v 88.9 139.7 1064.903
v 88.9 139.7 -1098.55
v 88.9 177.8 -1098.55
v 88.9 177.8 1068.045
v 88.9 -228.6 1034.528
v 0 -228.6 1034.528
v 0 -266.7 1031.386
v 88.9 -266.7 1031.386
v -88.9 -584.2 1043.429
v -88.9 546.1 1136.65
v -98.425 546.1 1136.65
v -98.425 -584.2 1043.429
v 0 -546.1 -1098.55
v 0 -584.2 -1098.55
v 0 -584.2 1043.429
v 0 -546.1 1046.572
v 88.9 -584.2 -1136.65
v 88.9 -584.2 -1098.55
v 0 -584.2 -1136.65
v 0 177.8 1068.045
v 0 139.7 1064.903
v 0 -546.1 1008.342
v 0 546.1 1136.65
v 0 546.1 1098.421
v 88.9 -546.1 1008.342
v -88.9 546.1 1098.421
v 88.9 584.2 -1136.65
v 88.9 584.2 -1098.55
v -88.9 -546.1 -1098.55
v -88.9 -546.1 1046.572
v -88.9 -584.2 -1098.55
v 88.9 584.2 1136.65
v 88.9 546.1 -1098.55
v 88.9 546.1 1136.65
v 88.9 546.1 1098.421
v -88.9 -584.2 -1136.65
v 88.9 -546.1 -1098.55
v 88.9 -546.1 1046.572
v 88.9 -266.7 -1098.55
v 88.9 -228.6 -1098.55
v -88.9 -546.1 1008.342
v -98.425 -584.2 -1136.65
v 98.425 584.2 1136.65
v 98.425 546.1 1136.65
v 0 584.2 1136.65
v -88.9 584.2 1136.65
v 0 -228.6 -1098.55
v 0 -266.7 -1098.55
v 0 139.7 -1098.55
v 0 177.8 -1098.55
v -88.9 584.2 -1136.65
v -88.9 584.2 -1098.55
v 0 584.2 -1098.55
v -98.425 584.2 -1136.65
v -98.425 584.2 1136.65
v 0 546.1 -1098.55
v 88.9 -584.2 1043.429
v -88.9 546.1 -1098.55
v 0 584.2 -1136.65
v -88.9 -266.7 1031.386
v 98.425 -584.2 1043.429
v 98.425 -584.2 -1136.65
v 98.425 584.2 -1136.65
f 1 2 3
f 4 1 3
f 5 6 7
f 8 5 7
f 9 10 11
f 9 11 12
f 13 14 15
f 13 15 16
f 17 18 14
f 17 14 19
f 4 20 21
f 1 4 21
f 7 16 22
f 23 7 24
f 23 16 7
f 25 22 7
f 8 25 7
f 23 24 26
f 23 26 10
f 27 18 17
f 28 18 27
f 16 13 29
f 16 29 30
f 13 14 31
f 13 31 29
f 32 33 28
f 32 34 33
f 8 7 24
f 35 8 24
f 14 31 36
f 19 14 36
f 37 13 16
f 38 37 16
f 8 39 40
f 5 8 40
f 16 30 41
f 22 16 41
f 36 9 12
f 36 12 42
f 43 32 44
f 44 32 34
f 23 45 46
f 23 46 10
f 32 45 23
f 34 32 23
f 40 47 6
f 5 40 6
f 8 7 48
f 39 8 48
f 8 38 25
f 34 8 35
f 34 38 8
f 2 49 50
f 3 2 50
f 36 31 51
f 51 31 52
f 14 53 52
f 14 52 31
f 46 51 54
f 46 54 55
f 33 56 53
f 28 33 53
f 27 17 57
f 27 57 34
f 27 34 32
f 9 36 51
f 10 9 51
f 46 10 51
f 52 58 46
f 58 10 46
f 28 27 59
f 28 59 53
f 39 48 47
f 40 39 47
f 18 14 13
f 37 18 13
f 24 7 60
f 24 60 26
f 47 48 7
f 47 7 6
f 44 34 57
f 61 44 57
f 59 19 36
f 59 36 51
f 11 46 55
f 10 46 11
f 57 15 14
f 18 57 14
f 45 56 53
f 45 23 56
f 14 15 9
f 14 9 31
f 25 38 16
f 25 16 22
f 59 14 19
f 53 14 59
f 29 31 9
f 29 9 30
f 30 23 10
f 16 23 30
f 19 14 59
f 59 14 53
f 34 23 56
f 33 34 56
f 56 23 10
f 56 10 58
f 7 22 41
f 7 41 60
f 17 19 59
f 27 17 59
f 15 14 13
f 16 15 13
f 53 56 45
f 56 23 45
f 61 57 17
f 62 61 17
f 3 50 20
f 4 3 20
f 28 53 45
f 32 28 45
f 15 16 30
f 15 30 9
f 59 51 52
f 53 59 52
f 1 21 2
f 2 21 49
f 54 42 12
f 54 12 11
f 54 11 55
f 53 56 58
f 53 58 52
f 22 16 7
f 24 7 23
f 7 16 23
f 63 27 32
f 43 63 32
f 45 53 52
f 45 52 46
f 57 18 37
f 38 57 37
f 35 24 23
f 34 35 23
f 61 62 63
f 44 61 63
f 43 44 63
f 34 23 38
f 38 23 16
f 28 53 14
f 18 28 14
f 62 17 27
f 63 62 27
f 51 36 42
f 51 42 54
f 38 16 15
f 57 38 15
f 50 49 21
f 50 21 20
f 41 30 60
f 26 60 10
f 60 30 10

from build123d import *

# Parameters (mm, degrees)
F1_DEPTH = 88.9
F2_DEPTH = 88.9
F4_DEPTH = 9.525


with BuildPart() as f1:
    # F0 (on Right) → F1 (new body)
    with BuildSketch(Plane.YZ):
        Polygon((-584.2, 1043.4293814433), (-584.2, -1098.55), (-546.1, -1098.55), (-546.1, 1008.3422910222), (-546.1, 1046.5716494845), align=None)
    extrude(amount=F1_DEPTH)


with BuildPart() as f1b:
    # F0 (on Right) → F1, piece 2 (new body)
    with BuildSketch(Plane.YZ):
        Polygon((546.1, -1098.55), (584.2, -1098.55), (584.2, 1136.65), (546.1, 1136.65), (546.1, 1098.4206415376), align=None)
    extrude(amount=F1_DEPTH)


with BuildPart() as f1c:
    # F0 (on Right) → F1, piece 3 (new body)
    with BuildSketch(Plane.YZ):
        Polygon((139.7, -1098.55), (177.8, -1098.55), (177.8, 1068.0453838057), (139.7, 1064.9031157645), align=None)
    extrude(amount=F1_DEPTH)


with BuildPart() as f1d:
    # F0 (on Right) → F1, piece 4 (new body)
    with BuildSketch(Plane.YZ):
        Polygon((-266.7, 1031.3855899913), (-266.7, -1098.55), (-228.6, -1098.55), (-228.6, 1034.5278580325), align=None)
    extrude(amount=F1_DEPTH)


with BuildPart() as f2:
    # F0 (on Right) → F2 (new body)
    with BuildSketch(Plane.YZ):
        Polygon((177.8, 1068.0453838057), (546.1, 1098.4206415376), (546.1, 1136.65), (-546.1, 1046.5716494845), (-546.1, 1008.3422910222), (-266.7, 1031.3855899913), (-266.7, 1034.5278580325), (-228.6, 1034.5278580325), (139.7, 1064.9031157645), (139.7, 1068.0453838057), align=None)
        Polygon((139.7, 1064.9031157645), (177.8, 1068.0453838057), (139.7, 1068.0453838057), align=None)
        Polygon((-266.7, 1034.5278580325), (-266.7, 1031.3855899913), (-228.6, 1034.5278580325), align=None)
    extrude(amount=F2_DEPTH)


with BuildPart() as f2b:
    # F0 (on Right) → F2, piece 2 (new body)
    with BuildSketch(Plane.YZ):
        Polygon((-584.2, -1136.65), (584.2, -1136.65), (584.2, -1098.55), (546.1, -1098.55), (177.8, -1098.55), (139.7, -1098.55), (-228.6, -1098.55), (-266.7, -1098.55), (-546.1, -1098.55), (-584.2, -1098.55), align=None)
    extrude(amount=F2_DEPTH)


with BuildPart() as f4:
    # F3 (on face) → F4 (new body)
    with BuildSketch(Plane.YZ.offset(88.9)):
        Polygon((584.2, 1136.65), (546.1, 1136.65), (-584.2, 1043.4293814433), (-584.2, -1136.65), (584.2, -1136.65), align=None)
    extrude(amount=F4_DEPTH)


with BuildPart() as f5_1:
    # F5: instance of F1b
    add(f1b.part.mirror(Plane.YZ))


with BuildPart() as f5_2:
    # F5: instance of F1
    add(f1.part.mirror(Plane.YZ))


with BuildPart() as f5_3:
    # F5: instance of F2b
    add(f2b.part.mirror(Plane.YZ))


with BuildPart() as f5_4:
    # F5: instance of F2
    add(f2.part.mirror(Plane.YZ))


with BuildPart() as f5_5:
    # F5: instance of F4
    add(f4.part.mirror(Plane.YZ))


solid = Compound([f1.part, f1b.part, f1c.part, f1d.part, f2.part, f2b.part, f4.part, f5_1.part, f5_2.part, f5_3.part, f5_4.part, f5_5.part])
